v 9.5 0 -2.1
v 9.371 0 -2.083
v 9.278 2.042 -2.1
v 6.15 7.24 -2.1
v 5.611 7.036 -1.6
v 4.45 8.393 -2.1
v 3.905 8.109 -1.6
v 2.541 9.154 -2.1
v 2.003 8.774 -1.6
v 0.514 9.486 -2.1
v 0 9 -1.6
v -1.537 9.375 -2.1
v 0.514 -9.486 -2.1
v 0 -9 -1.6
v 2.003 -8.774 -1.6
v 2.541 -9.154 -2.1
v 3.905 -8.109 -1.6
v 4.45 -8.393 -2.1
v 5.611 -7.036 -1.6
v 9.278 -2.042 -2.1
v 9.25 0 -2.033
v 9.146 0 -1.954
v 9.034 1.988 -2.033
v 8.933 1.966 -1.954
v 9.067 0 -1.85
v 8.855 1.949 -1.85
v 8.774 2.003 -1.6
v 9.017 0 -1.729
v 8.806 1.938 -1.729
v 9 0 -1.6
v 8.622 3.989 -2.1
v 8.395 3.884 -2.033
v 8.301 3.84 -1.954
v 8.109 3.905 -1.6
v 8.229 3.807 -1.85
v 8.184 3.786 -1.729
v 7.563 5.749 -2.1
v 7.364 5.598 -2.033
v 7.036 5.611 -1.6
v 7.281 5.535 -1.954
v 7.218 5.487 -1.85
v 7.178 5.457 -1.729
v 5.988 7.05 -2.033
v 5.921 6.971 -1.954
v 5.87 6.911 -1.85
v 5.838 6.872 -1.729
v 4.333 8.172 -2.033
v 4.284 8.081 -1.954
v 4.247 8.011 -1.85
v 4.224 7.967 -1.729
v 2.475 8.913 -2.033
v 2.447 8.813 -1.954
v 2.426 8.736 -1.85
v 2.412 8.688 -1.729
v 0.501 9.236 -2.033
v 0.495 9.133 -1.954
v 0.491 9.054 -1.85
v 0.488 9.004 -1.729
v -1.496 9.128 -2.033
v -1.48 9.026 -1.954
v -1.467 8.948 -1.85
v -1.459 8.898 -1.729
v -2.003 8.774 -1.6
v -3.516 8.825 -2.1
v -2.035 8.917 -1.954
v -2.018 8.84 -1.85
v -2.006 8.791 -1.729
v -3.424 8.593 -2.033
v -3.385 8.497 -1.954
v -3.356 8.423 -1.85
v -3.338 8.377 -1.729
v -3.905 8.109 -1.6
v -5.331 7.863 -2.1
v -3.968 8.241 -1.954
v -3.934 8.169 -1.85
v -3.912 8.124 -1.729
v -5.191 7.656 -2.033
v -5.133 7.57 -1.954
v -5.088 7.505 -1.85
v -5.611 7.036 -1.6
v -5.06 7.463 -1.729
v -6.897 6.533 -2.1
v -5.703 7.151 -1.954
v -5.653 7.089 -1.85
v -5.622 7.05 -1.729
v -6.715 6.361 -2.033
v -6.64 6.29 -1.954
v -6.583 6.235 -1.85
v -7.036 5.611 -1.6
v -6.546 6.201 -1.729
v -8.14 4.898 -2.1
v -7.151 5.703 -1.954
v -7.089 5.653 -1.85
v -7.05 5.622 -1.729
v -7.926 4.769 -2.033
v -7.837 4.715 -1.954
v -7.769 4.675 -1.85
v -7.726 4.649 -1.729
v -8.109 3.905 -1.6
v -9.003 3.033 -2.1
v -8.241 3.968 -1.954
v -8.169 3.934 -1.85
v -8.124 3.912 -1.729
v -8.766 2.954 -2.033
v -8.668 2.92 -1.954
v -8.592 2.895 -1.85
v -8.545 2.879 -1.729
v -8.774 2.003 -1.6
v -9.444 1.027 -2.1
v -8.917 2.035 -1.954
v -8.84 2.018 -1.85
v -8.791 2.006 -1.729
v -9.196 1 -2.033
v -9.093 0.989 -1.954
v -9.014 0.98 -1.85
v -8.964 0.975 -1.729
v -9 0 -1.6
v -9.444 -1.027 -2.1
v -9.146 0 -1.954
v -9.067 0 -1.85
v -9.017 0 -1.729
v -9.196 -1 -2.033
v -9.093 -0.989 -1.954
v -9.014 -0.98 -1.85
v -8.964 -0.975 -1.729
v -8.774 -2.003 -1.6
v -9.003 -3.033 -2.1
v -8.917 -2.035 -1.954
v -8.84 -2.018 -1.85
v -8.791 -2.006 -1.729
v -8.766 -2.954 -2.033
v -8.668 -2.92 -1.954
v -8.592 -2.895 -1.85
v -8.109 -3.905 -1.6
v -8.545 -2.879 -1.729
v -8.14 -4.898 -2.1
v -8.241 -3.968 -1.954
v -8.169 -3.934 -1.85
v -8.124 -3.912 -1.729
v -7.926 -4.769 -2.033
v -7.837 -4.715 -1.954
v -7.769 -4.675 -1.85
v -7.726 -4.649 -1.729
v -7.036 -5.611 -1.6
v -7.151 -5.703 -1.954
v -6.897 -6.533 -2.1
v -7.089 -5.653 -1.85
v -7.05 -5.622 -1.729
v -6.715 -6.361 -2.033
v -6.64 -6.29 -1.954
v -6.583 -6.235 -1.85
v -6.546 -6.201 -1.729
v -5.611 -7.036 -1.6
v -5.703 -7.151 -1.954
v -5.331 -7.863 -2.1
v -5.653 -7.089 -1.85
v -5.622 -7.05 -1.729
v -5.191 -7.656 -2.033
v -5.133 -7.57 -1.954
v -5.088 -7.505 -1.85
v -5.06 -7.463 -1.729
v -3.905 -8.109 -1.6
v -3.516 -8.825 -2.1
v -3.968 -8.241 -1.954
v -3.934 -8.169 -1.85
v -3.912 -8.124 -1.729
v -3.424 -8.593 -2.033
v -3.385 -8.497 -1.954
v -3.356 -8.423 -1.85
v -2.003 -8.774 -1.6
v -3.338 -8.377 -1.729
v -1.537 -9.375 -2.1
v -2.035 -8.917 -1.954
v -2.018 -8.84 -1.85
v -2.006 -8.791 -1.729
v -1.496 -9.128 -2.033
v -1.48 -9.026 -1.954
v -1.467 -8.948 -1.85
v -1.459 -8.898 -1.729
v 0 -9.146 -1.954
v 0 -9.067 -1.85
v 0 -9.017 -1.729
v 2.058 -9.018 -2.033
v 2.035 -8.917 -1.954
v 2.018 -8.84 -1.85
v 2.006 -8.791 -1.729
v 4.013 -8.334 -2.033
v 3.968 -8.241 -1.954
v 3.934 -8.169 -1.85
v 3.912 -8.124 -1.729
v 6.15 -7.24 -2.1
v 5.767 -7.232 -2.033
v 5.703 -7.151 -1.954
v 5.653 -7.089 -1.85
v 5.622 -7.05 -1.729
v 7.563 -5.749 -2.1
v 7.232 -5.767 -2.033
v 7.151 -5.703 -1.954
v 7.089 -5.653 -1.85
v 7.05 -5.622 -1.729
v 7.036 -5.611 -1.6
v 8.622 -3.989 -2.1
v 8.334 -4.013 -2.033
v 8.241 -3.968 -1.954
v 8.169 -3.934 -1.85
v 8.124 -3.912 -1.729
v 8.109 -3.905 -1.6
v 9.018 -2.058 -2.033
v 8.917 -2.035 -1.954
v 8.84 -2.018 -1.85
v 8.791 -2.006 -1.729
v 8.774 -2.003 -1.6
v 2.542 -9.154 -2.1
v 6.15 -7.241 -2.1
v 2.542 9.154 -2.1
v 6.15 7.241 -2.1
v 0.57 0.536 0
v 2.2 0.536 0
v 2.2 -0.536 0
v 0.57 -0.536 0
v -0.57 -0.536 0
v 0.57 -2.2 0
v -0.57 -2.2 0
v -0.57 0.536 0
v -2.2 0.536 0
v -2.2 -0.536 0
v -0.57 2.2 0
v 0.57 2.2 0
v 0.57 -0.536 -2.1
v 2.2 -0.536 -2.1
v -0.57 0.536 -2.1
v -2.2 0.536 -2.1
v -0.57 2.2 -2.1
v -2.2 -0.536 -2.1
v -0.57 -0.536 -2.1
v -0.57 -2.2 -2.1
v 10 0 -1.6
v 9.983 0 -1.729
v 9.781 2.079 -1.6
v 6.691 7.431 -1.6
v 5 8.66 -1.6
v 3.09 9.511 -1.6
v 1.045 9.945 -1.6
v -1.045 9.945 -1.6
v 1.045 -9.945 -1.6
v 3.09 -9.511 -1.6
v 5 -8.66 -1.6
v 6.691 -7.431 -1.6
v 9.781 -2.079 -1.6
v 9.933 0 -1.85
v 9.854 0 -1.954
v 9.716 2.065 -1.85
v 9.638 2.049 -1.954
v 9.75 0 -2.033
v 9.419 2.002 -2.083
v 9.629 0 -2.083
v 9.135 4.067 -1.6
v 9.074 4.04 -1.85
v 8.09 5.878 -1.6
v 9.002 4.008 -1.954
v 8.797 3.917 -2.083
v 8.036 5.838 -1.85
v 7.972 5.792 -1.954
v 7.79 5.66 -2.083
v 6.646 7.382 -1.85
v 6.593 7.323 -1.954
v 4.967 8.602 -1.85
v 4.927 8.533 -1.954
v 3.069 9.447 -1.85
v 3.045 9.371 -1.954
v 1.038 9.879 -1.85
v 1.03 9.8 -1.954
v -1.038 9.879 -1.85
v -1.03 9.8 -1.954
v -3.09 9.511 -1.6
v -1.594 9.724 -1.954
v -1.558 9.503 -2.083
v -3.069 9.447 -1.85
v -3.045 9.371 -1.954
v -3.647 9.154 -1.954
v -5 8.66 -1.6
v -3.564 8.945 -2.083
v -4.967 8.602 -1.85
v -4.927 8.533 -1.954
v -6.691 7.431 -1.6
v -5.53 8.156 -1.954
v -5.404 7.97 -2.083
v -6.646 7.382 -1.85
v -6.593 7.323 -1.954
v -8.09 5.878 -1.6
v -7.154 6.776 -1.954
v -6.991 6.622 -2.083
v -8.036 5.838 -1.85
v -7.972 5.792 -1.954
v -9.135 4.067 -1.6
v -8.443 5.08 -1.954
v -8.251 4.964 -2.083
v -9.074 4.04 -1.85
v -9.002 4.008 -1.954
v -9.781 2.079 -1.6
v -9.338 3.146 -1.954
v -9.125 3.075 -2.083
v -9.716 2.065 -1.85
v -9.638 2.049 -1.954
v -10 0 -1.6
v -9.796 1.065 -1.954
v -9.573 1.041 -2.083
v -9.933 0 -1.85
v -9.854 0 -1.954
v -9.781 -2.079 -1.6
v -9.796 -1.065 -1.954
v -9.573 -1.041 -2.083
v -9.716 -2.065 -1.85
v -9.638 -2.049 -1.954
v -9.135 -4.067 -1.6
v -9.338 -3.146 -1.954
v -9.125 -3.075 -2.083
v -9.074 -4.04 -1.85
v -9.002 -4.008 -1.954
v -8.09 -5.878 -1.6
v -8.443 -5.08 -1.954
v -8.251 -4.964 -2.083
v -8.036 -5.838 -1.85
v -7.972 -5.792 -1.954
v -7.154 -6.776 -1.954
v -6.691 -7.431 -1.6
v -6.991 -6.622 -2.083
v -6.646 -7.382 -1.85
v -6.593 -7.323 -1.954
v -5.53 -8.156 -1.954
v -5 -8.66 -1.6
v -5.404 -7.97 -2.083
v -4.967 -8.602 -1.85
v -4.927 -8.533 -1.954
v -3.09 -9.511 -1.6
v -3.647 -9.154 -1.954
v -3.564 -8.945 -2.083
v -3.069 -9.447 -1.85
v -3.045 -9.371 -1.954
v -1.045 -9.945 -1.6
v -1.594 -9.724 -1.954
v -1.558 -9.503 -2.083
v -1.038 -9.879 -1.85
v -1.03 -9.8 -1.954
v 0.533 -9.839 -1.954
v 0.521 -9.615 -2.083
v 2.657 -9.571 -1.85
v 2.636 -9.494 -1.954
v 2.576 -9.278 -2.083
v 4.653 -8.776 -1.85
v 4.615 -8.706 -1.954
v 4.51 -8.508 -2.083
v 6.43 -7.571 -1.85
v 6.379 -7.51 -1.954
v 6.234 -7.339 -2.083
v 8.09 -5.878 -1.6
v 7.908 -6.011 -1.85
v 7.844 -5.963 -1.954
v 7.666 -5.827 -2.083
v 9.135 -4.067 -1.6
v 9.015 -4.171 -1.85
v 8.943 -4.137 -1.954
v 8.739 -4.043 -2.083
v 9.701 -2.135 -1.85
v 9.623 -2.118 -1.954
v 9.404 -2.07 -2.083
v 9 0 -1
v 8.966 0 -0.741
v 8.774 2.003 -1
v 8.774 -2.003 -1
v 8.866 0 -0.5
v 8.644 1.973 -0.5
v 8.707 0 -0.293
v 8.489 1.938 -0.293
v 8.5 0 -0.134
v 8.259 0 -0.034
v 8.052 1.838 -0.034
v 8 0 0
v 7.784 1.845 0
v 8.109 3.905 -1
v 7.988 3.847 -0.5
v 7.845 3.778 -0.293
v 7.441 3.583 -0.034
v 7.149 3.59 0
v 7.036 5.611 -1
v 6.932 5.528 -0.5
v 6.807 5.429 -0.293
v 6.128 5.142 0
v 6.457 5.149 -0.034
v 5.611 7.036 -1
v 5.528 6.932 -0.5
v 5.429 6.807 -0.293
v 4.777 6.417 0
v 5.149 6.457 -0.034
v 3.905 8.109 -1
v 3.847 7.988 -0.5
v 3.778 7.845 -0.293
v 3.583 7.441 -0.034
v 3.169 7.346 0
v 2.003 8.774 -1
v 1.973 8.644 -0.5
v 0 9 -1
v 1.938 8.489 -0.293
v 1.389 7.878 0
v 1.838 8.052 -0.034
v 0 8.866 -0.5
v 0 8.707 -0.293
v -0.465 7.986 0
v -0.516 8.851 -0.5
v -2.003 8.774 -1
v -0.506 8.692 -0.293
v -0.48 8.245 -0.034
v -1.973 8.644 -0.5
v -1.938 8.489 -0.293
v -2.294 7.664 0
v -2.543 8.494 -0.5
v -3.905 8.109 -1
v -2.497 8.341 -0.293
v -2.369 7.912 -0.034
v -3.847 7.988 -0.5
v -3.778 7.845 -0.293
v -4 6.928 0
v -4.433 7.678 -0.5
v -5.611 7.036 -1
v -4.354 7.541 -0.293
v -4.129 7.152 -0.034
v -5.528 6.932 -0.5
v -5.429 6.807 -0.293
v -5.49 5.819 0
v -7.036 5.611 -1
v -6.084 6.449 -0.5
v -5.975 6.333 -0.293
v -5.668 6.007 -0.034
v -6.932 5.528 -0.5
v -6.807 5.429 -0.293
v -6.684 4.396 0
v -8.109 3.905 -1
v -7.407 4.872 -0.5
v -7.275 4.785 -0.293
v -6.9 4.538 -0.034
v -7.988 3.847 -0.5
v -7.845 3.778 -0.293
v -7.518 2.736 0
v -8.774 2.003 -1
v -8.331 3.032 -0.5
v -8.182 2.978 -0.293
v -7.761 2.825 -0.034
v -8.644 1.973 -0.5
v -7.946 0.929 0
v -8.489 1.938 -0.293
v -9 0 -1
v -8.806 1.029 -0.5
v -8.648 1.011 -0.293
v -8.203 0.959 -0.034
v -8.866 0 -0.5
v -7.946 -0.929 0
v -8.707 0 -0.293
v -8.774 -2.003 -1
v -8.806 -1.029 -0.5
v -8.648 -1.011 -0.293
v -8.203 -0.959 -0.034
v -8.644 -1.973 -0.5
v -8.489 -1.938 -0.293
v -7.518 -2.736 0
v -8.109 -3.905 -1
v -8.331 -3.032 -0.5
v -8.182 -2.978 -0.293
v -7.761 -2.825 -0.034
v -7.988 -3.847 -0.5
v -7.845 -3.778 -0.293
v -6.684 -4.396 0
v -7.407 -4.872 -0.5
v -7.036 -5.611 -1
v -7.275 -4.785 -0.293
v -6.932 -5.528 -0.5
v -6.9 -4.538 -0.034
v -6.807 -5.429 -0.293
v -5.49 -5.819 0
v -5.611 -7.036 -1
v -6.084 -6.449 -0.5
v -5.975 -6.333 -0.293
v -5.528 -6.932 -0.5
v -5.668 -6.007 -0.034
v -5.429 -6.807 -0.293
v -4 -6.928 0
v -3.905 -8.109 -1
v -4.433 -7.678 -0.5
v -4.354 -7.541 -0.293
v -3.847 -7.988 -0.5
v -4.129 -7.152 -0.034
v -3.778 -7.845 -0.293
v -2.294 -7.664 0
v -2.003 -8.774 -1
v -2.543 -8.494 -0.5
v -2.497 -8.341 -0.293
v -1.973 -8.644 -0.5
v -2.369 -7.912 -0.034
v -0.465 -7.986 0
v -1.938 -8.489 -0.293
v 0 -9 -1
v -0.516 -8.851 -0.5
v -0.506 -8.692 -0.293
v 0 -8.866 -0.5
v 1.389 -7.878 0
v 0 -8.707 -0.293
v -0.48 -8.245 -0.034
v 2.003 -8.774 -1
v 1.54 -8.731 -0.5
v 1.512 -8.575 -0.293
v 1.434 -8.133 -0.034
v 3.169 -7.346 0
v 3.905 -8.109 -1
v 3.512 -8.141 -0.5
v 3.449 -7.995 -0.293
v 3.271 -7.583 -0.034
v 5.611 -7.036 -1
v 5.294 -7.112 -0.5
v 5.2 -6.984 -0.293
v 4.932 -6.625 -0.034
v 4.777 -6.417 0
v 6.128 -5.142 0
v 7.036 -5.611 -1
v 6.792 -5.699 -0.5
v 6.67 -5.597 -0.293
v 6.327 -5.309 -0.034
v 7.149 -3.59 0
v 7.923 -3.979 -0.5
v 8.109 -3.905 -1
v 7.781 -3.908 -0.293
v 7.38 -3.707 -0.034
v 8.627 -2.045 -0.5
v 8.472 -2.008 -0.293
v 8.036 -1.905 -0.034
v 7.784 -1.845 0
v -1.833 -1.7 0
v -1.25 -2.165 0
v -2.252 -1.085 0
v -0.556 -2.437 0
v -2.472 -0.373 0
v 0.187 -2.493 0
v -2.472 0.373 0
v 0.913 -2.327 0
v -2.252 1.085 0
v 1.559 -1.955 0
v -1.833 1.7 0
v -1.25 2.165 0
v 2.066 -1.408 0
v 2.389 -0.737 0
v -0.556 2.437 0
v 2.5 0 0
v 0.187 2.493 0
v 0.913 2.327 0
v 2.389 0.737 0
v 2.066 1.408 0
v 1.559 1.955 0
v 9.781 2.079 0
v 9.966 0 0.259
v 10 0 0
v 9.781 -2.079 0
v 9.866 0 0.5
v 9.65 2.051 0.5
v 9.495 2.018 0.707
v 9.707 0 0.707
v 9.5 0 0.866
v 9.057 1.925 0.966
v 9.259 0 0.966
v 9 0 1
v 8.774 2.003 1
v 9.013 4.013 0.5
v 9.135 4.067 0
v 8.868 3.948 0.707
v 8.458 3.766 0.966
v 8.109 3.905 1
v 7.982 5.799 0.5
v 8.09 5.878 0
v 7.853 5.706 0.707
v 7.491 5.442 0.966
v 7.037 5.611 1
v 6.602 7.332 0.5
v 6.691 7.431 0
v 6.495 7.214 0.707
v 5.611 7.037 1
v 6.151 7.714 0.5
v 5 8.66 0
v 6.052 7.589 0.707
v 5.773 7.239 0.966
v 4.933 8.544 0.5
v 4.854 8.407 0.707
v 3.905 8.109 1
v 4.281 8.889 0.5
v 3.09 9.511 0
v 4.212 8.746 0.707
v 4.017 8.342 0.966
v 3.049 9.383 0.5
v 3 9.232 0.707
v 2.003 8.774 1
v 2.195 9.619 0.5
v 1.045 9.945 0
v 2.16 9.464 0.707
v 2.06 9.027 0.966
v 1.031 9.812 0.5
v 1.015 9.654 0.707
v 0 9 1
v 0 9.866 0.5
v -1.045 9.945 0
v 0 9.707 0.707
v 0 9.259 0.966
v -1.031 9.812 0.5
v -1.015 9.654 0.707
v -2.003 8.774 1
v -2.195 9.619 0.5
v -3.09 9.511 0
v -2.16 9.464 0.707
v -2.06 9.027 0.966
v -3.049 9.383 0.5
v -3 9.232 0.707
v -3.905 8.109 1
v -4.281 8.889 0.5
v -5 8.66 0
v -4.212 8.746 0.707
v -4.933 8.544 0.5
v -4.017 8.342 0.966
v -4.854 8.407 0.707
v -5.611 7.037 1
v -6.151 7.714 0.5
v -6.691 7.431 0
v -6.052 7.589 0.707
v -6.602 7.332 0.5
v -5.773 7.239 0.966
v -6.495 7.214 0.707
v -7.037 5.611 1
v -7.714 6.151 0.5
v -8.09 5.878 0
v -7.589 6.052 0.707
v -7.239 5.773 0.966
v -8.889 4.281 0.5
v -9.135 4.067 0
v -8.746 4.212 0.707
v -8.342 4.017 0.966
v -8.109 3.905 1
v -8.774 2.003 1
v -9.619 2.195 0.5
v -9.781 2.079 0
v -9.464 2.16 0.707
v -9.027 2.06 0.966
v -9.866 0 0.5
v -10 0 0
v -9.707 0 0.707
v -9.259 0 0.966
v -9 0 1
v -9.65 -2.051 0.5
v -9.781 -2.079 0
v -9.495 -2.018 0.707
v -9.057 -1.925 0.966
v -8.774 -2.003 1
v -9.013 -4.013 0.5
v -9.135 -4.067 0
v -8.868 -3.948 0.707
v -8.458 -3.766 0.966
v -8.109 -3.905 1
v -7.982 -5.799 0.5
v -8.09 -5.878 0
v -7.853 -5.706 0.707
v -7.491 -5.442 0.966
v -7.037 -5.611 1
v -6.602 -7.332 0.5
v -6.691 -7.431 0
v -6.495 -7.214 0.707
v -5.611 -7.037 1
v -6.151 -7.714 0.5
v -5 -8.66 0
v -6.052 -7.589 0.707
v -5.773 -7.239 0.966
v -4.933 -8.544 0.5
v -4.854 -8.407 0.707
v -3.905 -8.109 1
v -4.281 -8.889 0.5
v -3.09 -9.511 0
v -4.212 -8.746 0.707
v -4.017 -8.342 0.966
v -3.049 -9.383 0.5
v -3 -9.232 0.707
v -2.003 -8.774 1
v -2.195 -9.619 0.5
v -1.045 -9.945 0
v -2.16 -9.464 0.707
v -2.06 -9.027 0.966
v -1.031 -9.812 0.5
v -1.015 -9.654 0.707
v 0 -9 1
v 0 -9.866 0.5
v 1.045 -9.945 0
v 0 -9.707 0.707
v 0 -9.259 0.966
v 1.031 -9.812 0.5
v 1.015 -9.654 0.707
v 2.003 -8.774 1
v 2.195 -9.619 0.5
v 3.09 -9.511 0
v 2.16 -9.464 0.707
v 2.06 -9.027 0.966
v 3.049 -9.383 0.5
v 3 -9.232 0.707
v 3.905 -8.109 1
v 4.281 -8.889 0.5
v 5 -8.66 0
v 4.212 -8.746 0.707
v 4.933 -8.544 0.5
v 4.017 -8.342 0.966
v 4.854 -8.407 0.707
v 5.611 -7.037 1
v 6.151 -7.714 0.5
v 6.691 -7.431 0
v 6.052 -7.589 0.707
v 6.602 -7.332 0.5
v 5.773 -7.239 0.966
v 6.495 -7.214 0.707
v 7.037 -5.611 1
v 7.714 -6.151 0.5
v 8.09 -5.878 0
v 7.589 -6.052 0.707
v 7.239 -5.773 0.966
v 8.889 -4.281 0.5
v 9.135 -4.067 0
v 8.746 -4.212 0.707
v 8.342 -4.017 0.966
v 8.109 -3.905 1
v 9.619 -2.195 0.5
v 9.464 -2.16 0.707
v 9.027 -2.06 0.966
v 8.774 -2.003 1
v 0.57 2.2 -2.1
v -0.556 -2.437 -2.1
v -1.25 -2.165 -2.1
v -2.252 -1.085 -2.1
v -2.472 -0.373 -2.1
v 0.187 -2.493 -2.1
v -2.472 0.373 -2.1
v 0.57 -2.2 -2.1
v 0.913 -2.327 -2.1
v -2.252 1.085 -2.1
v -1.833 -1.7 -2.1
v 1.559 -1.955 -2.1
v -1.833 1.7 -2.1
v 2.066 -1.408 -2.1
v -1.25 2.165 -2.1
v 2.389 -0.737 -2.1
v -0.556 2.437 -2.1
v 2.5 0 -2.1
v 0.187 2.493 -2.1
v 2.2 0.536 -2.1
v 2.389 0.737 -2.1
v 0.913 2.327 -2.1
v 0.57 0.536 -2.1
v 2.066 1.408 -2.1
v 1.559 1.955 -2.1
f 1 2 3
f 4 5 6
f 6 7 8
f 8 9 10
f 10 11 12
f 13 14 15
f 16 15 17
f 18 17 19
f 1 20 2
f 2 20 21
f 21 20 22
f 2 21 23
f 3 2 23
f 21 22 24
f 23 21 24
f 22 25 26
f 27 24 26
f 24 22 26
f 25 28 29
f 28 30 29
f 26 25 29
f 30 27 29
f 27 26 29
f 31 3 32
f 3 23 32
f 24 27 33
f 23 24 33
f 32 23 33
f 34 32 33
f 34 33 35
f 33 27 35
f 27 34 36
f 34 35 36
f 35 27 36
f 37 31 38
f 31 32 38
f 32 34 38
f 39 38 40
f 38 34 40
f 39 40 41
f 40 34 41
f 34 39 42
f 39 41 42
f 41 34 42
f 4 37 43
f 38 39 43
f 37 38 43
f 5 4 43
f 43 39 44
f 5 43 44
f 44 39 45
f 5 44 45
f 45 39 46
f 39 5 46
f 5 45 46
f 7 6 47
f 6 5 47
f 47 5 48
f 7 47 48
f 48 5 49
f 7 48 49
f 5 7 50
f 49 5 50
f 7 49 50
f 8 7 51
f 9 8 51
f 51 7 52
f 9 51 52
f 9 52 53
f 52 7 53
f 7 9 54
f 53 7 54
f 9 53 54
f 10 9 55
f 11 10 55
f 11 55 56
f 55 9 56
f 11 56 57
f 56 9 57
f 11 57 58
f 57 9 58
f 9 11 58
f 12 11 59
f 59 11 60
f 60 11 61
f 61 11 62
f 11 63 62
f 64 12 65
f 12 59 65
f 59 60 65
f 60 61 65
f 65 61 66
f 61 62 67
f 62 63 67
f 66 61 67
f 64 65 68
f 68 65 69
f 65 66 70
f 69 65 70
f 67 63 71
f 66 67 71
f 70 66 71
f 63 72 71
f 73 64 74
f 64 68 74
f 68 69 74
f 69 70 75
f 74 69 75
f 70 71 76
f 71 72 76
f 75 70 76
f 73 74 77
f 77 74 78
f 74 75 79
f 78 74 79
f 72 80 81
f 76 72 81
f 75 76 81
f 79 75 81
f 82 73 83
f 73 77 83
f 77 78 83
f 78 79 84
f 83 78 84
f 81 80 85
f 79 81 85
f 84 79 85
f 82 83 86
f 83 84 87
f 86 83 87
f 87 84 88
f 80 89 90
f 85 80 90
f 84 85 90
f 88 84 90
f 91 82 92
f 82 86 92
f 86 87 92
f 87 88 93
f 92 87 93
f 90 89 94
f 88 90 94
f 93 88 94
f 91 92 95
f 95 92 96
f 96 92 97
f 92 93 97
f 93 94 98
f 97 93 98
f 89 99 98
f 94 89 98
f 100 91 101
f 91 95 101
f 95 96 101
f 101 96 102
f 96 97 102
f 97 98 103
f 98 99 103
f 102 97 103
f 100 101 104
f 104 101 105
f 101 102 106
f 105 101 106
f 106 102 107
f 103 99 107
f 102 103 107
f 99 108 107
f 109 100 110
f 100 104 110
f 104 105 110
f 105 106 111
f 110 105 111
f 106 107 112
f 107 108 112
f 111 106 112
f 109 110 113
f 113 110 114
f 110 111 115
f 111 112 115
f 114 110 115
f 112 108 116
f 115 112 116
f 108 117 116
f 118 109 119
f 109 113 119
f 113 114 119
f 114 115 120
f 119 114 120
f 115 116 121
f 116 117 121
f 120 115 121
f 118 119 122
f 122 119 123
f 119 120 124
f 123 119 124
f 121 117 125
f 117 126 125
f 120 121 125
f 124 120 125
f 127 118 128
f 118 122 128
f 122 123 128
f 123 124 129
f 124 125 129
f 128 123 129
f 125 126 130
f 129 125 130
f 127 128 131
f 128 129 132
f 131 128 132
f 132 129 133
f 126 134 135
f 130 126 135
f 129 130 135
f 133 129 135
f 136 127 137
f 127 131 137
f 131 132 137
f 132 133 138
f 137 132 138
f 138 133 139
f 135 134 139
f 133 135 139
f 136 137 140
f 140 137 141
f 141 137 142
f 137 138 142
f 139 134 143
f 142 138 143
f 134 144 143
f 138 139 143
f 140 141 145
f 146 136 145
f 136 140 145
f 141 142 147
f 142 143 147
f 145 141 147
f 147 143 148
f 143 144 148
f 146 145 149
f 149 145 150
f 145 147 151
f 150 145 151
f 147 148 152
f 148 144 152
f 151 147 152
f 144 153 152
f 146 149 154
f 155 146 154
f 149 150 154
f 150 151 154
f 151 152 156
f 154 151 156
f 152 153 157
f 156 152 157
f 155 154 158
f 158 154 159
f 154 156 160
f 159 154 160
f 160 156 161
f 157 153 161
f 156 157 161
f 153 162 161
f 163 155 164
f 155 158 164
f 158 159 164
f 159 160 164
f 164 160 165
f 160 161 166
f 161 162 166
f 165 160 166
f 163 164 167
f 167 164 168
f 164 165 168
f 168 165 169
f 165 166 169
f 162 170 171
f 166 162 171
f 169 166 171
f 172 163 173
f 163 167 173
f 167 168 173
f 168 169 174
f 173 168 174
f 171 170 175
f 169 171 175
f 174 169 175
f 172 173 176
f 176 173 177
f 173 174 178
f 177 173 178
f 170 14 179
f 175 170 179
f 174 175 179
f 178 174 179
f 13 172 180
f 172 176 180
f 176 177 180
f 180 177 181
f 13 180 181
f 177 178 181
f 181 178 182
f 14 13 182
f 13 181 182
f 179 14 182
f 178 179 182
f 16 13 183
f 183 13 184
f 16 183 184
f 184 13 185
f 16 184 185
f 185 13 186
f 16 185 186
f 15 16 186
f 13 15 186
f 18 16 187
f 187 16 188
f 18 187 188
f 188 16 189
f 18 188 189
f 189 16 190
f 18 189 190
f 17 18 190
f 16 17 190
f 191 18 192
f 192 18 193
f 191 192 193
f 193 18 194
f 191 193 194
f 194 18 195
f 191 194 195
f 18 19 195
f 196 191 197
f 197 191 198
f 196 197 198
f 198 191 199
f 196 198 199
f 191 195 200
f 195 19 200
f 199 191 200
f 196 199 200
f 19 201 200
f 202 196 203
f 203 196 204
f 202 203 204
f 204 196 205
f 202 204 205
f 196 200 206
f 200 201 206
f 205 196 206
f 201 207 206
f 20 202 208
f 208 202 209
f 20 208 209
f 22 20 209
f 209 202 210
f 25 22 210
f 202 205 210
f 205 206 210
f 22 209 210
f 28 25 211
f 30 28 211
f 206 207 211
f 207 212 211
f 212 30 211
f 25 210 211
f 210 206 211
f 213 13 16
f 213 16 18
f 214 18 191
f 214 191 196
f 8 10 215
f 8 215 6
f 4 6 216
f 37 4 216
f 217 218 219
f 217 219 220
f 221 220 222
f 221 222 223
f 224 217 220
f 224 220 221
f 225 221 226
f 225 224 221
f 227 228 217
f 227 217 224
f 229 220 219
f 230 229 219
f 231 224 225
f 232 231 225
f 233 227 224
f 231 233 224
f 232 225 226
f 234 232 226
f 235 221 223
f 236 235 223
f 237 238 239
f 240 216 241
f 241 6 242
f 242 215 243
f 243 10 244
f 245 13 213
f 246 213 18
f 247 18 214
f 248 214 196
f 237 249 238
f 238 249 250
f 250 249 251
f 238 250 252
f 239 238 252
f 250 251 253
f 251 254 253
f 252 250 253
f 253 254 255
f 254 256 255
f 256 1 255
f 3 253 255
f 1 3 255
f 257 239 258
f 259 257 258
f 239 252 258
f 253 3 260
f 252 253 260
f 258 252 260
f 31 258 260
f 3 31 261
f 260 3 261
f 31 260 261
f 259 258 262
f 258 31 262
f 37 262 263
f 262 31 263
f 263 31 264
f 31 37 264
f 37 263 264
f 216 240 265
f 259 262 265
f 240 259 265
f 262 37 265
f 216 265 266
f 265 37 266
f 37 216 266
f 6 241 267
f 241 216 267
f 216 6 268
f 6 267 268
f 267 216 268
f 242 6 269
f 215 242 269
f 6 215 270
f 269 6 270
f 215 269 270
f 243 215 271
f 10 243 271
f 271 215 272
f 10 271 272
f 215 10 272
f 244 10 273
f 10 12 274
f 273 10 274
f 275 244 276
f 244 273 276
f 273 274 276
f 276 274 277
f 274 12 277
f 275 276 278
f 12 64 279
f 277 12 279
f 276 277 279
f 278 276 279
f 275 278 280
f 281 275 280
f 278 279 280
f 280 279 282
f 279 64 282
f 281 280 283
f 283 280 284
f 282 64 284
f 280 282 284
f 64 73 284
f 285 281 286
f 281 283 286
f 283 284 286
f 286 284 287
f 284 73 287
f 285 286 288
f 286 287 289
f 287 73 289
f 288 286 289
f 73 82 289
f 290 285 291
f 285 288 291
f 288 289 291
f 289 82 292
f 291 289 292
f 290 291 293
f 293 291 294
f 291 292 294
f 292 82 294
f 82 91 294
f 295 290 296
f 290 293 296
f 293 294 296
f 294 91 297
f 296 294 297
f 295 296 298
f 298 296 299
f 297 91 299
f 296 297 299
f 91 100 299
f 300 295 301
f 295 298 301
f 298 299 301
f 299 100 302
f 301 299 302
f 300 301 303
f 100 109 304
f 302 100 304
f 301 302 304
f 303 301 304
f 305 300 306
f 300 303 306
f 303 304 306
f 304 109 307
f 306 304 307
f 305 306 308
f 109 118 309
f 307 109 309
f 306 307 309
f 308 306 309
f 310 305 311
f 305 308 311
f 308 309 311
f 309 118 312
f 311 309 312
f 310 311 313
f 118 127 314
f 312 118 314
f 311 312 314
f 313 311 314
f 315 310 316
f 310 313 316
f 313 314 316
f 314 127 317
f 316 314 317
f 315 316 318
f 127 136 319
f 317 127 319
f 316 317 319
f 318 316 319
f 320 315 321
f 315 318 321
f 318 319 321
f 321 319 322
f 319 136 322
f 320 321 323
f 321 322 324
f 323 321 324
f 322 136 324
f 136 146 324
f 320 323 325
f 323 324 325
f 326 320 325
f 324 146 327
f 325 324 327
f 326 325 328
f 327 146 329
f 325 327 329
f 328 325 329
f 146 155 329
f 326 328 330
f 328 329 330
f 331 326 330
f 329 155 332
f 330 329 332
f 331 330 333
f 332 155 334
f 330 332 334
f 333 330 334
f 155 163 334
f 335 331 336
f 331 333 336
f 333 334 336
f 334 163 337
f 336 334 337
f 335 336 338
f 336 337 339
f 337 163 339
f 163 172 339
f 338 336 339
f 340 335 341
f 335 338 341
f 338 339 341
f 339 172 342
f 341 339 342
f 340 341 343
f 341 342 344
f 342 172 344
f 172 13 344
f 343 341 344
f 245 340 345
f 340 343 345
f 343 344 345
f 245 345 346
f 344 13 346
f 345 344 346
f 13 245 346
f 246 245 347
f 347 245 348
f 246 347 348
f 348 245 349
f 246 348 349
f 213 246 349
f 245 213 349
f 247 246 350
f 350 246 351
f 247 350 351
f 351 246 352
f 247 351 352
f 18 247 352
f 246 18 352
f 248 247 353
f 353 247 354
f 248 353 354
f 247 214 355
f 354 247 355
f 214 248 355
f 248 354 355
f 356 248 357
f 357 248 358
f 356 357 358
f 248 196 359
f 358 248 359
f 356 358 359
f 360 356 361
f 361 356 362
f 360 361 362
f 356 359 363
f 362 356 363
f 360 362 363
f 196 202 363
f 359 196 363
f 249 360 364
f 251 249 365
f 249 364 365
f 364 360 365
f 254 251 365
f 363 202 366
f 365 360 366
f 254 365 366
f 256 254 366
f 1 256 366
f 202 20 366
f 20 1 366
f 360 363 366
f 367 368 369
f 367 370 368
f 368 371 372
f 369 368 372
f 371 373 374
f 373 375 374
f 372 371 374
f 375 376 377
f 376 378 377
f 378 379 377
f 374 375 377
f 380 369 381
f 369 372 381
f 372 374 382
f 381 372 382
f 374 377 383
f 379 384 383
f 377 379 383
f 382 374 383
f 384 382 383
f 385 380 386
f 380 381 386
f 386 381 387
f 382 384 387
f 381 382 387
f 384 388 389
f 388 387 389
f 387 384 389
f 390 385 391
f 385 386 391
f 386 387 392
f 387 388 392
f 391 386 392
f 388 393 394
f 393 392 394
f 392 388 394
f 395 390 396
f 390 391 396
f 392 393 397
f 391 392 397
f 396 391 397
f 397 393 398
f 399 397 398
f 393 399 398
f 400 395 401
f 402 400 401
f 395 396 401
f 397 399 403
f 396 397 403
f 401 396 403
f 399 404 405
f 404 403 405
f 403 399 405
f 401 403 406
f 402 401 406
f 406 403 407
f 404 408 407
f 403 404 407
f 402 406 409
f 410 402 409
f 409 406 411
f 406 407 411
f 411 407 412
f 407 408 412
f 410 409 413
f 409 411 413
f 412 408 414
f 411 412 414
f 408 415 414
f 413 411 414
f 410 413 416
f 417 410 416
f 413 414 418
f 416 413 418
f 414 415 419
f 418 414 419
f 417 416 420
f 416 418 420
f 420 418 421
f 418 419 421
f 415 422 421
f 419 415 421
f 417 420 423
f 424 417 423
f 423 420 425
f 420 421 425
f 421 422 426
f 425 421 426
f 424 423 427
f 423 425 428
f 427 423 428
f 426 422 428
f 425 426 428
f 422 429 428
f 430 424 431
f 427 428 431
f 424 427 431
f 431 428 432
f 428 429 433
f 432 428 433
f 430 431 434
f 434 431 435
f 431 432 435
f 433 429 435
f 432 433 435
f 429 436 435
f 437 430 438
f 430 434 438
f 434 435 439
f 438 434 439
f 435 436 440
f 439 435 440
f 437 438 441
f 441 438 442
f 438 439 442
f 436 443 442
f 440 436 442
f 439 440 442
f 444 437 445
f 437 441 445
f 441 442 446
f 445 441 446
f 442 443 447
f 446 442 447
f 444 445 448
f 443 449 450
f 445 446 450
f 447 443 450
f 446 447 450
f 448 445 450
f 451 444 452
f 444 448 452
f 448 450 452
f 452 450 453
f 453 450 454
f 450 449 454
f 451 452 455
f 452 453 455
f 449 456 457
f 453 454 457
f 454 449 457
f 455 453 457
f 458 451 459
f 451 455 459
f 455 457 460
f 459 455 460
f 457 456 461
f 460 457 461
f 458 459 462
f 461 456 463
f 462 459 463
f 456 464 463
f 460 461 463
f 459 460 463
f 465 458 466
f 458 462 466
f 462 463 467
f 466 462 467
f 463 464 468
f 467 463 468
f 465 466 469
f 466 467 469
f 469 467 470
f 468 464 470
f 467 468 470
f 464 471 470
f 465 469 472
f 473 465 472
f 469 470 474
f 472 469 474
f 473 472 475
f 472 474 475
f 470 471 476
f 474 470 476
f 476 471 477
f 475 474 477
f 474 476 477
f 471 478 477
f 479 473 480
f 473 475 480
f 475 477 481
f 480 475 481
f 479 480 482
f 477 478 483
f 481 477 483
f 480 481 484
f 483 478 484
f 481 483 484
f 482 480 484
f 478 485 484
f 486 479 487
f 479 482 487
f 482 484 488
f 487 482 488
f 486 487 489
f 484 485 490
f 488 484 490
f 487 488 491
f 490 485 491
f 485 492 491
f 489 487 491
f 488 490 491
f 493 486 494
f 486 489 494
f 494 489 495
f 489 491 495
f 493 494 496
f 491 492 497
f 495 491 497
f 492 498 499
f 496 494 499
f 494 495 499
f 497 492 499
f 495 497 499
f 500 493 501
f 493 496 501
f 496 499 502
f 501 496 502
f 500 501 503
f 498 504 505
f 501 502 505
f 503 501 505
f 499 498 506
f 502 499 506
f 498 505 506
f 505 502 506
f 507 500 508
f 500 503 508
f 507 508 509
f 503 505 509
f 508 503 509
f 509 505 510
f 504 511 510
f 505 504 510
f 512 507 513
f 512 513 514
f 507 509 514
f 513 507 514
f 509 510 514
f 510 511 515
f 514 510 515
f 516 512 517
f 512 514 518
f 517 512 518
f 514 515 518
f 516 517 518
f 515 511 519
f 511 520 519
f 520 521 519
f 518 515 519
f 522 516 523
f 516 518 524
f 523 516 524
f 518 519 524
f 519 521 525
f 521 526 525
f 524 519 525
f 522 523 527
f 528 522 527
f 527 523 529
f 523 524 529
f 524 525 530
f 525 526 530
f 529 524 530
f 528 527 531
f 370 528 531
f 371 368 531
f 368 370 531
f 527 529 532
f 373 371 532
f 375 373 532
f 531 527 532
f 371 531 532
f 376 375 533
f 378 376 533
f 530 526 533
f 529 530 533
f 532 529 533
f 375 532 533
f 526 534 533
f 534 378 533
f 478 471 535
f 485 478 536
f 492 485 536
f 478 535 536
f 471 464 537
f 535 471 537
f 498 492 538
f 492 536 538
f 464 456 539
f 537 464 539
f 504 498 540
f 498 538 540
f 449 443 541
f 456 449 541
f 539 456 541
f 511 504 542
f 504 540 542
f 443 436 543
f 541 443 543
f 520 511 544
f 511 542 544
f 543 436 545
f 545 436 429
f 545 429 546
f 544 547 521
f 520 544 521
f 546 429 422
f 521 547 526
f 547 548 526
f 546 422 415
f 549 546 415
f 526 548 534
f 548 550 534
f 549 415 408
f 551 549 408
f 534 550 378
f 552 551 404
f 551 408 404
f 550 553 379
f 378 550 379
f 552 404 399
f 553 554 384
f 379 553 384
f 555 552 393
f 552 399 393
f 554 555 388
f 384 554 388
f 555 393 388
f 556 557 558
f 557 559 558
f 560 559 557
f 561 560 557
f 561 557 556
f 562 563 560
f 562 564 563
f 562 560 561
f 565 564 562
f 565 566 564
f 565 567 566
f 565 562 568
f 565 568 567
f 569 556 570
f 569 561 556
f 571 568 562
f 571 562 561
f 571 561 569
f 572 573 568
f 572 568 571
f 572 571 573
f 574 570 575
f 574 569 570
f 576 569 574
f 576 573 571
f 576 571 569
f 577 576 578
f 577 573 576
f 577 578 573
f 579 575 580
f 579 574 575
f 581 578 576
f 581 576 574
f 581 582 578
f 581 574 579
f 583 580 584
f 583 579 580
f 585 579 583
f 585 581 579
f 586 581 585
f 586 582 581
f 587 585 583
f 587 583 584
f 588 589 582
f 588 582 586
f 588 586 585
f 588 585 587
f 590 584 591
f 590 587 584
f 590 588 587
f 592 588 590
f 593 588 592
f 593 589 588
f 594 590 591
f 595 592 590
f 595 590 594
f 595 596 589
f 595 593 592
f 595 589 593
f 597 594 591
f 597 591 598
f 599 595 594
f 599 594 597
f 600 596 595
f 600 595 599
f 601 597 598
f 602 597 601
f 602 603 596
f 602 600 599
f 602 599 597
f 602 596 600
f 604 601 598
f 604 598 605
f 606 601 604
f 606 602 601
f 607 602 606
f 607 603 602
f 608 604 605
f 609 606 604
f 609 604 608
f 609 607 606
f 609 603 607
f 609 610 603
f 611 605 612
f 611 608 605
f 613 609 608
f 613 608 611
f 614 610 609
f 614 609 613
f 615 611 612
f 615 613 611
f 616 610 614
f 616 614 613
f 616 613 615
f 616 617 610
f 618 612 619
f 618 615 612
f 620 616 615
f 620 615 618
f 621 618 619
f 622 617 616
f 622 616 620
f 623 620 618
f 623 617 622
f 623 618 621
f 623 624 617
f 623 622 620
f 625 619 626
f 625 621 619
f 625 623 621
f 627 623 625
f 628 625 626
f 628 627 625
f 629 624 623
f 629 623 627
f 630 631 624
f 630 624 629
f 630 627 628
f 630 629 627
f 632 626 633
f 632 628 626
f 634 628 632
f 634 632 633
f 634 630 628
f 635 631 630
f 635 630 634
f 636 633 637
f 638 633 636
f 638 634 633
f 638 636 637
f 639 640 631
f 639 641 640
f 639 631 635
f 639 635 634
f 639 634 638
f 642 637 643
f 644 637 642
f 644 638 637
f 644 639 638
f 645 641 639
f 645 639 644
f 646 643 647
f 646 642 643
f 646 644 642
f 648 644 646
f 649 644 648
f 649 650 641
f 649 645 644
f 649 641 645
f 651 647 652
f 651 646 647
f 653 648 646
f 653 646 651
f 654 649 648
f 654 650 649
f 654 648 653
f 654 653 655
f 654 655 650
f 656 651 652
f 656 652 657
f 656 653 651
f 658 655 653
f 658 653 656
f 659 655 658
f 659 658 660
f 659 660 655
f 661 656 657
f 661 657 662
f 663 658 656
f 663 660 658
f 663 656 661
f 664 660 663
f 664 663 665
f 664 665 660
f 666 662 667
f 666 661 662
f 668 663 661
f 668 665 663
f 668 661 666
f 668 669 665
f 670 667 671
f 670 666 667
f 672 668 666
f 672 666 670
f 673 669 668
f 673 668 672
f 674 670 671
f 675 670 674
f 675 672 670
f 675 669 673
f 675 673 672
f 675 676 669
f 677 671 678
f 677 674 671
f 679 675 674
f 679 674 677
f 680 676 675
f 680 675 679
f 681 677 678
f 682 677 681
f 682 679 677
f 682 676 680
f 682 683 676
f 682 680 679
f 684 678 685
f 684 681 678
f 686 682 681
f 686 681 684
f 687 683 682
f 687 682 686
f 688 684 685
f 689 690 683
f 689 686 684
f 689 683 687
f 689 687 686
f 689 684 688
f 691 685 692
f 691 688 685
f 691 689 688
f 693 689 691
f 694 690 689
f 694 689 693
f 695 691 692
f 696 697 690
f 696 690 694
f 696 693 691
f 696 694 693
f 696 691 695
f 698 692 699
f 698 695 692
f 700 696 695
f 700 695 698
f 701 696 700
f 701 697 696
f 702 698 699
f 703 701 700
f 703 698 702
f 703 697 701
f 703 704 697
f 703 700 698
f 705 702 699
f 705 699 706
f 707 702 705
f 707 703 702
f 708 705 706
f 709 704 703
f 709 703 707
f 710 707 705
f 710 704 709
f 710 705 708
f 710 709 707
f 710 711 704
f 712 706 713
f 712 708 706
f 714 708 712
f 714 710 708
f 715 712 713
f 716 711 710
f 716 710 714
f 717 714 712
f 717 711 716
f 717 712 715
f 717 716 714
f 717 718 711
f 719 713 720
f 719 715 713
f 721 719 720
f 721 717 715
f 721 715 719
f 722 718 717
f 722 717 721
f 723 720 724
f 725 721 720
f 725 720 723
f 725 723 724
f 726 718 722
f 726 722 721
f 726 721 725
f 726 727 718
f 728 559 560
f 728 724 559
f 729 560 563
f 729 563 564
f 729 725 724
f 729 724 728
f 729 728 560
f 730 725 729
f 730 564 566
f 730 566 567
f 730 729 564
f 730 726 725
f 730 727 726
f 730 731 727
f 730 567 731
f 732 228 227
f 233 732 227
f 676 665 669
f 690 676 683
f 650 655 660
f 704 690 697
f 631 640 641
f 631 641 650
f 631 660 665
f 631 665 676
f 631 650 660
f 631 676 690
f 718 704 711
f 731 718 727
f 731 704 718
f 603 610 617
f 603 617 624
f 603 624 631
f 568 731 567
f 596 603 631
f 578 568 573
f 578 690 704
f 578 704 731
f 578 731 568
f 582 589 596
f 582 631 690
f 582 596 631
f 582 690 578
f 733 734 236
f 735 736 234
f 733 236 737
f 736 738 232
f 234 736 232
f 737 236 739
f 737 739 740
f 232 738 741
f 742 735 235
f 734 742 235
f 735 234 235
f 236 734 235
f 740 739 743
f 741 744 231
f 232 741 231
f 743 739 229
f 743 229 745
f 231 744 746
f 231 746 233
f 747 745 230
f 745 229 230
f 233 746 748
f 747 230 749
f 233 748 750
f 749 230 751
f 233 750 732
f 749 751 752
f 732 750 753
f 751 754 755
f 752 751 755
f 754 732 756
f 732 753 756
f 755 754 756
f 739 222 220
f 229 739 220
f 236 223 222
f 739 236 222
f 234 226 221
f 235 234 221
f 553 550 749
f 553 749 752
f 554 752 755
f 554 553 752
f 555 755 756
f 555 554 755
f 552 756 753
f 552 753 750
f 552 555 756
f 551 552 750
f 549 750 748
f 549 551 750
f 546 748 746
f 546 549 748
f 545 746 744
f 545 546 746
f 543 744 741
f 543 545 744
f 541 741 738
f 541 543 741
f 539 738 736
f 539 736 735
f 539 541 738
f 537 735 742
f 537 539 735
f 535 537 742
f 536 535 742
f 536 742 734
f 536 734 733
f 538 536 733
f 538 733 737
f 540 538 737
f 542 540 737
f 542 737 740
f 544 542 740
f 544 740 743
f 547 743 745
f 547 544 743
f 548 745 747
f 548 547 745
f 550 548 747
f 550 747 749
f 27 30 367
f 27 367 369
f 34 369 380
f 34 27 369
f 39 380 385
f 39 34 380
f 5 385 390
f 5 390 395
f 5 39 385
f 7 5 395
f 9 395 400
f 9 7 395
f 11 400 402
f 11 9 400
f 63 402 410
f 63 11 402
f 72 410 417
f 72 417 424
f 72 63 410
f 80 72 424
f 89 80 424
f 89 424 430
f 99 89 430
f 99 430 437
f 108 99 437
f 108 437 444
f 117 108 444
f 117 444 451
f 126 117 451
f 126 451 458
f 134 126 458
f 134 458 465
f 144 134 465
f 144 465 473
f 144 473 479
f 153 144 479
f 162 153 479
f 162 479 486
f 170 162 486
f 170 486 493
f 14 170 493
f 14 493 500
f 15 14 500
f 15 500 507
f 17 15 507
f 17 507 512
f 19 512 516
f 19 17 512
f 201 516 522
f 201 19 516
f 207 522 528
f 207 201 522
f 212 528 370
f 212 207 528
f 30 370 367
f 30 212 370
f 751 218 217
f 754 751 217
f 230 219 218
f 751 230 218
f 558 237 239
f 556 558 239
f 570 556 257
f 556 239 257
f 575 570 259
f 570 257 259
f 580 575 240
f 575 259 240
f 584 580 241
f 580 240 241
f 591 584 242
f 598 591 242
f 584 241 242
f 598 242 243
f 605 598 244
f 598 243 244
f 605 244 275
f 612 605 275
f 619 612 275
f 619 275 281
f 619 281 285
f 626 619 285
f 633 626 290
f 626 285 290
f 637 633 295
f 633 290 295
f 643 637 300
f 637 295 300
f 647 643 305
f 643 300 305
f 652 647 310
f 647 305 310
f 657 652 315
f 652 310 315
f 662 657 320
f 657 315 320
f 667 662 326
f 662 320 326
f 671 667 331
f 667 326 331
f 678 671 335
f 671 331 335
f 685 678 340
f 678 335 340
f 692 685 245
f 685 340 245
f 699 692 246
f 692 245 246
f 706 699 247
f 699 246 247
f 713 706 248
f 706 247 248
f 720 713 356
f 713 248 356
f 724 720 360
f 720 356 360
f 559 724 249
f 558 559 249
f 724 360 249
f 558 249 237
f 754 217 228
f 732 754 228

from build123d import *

# Parameters (mm, degrees)
SKETCH_1_R            = 2.5
EXTRUDE_19_DEPTH      = 2.1
EXTRUDE_START         = 1
SKETCH_1_24_R         = 9
SKETCH_1_24_R_2       = 2.5
EXTRUDE_20_DEPTH      = 1
EXTRUDE_21_DEPTH      = 1
EXTRUDE_21_DEPTH_BACK = 2.1
SKETCH_1_25_R         = 10
SKETCH_1_25_R_2       = 9
FILLET_1_R            = 1
FILLET_2_R            = 0.5
FILLET_3_R            = 0.5
FILLET_4_R            = 1


with BuildPart() as part:
    # 草图1 → 凸台-拉伸19 (new body)
    with BuildSketch(Plane.XY):
        Circle(SKETCH_1_R)
        Polygon((0.57030636, 0.535854496), (0.57030636, 2.2), (-0.57030636, 2.2), (-0.57030636, 0.535854496), (-2.2, 0.535854496), (-2.2, -0.535854496), (-0.57030636, -0.535854496), (-0.57030636, -2.2), (0.57030636, -2.2), (0.57030636, -0.535854496), (2.2, -0.535854496), (2.2, 0.535854496), align=None, mode=Mode.SUBTRACT)
    extrude(amount=-EXTRUDE_19_DEPTH)

    # 草图1<24> → 凸台-拉伸20 (add)
    # profile 1 of 4: a face of its own
    with BuildSketch(Plane.XY.offset(EXTRUDE_START)):
        Circle(SKETCH_1_24_R)
        Circle(SKETCH_1_24_R_2, mode=Mode.SUBTRACT)
    # profile 2 of 4: a face of its own
    with BuildSketch(Plane.XY.offset(EXTRUDE_START)):
        Circle(SKETCH_1_24_R_2)
        Polygon((0.57030636, 0.535854496), (0.57030636, 2.2), (-0.57030636, 2.2), (-0.57030636, 0.535854496), (-2.2, 0.535854496), (-2.2, -0.535854496), (-0.57030636, -0.535854496), (-0.57030636, -2.2), (0.57030636, -2.2), (0.57030636, -0.535854496), (2.2, -0.535854496), (2.2, 0.535854496), align=None, mode=Mode.SUBTRACT)
    # profile 3 of 4: a face of its own
    with BuildSketch(Plane.XY.offset(EXTRUDE_START)):
        Polygon((0.57030636, 0.535854496), (2.2, 0.535854496), (2.2, -0.535854496), (0.57030636, -0.535854496), (0.57030636, -2.2), (-0.57030636, -2.2), (-0.57030636, -0.535854496), (-2.2, -0.535854496), (-2.2, 0.535854496), (-0.57030636, 0.535854496), (-0.57030636, 2.2), (0.57030636, 2.2), align=None)
        Polygon((0.37030636, -0.335854496), (2, -0.335854496), (2, 0.335854496), (0.37030636, 0.335854496), (0.37030636, 2), (-0.37030636, 2), (-0.37030636, 0.335854496), (-2, 0.335854496), (-2, -0.335854496), (-0.37030636, -0.335854496), (-0.37030636, -2), (0.37030636, -2), align=None, mode=Mode.SUBTRACT)
    # profile 4 of 4: a face of its own
    with BuildSketch(Plane.XY.offset(EXTRUDE_START)):
        Polygon((0.37030636, -2), (0.37030636, -0.335854496), (2, -0.335854496), (2, 0.335854496), (0.37030636, 0.335854496), (0.37030636, 2), (-0.37030636, 2), (-0.37030636, 0.335854496), (-2, 0.335854496), (-2, -0.335854496), (-0.37030636, -0.335854496), (-0.37030636, -2), align=None)
    extrude(amount=-EXTRUDE_20_DEPTH)

    # 草图1<25> → 凸台-拉伸21 (add, two sides: drawn at the far end of the back side and taken through both)
    with BuildSketch(Plane.XY.offset(-EXTRUDE_21_DEPTH_BACK)):
        Circle(SKETCH_1_25_R)
        Circle(SKETCH_1_25_R_2, mode=Mode.SUBTRACT)
    extrude(amount=EXTRUDE_21_DEPTH + EXTRUDE_21_DEPTH_BACK)

    # 圆角1
    fillet_1_edges = [part.edges().sort_by_distance(p)[0] for p in [
        (-10, 0, 1),
    ]]
    fillet(fillet_1_edges, radius=FILLET_1_R - 0.0001)  # a hair under: the kernel refuses the full size

    # 圆角2
    fillet_2_edges = [part.edges().sort_by_distance(p)[0] for p in [
        (-10, 0, -2.1),
    ]]
    fillet(fillet_2_edges, radius=FILLET_2_R)

    # 圆角3
    fillet_3_edges = [part.edges().sort_by_distance(p)[0] for p in [
        (-9, 0, -2.1),
    ]]
    fillet(fillet_3_edges, radius=FILLET_3_R - 0.0001)  # a hair under: the kernel refuses the full size

    # 圆角4
    fillet_4_edges = [part.edges().sort_by_distance(p)[0] for p in [
        (-9, 0, 0),
    ]]
    fillet(fillet_4_edges, radius=FILLET_4_R)


solid = part.part
